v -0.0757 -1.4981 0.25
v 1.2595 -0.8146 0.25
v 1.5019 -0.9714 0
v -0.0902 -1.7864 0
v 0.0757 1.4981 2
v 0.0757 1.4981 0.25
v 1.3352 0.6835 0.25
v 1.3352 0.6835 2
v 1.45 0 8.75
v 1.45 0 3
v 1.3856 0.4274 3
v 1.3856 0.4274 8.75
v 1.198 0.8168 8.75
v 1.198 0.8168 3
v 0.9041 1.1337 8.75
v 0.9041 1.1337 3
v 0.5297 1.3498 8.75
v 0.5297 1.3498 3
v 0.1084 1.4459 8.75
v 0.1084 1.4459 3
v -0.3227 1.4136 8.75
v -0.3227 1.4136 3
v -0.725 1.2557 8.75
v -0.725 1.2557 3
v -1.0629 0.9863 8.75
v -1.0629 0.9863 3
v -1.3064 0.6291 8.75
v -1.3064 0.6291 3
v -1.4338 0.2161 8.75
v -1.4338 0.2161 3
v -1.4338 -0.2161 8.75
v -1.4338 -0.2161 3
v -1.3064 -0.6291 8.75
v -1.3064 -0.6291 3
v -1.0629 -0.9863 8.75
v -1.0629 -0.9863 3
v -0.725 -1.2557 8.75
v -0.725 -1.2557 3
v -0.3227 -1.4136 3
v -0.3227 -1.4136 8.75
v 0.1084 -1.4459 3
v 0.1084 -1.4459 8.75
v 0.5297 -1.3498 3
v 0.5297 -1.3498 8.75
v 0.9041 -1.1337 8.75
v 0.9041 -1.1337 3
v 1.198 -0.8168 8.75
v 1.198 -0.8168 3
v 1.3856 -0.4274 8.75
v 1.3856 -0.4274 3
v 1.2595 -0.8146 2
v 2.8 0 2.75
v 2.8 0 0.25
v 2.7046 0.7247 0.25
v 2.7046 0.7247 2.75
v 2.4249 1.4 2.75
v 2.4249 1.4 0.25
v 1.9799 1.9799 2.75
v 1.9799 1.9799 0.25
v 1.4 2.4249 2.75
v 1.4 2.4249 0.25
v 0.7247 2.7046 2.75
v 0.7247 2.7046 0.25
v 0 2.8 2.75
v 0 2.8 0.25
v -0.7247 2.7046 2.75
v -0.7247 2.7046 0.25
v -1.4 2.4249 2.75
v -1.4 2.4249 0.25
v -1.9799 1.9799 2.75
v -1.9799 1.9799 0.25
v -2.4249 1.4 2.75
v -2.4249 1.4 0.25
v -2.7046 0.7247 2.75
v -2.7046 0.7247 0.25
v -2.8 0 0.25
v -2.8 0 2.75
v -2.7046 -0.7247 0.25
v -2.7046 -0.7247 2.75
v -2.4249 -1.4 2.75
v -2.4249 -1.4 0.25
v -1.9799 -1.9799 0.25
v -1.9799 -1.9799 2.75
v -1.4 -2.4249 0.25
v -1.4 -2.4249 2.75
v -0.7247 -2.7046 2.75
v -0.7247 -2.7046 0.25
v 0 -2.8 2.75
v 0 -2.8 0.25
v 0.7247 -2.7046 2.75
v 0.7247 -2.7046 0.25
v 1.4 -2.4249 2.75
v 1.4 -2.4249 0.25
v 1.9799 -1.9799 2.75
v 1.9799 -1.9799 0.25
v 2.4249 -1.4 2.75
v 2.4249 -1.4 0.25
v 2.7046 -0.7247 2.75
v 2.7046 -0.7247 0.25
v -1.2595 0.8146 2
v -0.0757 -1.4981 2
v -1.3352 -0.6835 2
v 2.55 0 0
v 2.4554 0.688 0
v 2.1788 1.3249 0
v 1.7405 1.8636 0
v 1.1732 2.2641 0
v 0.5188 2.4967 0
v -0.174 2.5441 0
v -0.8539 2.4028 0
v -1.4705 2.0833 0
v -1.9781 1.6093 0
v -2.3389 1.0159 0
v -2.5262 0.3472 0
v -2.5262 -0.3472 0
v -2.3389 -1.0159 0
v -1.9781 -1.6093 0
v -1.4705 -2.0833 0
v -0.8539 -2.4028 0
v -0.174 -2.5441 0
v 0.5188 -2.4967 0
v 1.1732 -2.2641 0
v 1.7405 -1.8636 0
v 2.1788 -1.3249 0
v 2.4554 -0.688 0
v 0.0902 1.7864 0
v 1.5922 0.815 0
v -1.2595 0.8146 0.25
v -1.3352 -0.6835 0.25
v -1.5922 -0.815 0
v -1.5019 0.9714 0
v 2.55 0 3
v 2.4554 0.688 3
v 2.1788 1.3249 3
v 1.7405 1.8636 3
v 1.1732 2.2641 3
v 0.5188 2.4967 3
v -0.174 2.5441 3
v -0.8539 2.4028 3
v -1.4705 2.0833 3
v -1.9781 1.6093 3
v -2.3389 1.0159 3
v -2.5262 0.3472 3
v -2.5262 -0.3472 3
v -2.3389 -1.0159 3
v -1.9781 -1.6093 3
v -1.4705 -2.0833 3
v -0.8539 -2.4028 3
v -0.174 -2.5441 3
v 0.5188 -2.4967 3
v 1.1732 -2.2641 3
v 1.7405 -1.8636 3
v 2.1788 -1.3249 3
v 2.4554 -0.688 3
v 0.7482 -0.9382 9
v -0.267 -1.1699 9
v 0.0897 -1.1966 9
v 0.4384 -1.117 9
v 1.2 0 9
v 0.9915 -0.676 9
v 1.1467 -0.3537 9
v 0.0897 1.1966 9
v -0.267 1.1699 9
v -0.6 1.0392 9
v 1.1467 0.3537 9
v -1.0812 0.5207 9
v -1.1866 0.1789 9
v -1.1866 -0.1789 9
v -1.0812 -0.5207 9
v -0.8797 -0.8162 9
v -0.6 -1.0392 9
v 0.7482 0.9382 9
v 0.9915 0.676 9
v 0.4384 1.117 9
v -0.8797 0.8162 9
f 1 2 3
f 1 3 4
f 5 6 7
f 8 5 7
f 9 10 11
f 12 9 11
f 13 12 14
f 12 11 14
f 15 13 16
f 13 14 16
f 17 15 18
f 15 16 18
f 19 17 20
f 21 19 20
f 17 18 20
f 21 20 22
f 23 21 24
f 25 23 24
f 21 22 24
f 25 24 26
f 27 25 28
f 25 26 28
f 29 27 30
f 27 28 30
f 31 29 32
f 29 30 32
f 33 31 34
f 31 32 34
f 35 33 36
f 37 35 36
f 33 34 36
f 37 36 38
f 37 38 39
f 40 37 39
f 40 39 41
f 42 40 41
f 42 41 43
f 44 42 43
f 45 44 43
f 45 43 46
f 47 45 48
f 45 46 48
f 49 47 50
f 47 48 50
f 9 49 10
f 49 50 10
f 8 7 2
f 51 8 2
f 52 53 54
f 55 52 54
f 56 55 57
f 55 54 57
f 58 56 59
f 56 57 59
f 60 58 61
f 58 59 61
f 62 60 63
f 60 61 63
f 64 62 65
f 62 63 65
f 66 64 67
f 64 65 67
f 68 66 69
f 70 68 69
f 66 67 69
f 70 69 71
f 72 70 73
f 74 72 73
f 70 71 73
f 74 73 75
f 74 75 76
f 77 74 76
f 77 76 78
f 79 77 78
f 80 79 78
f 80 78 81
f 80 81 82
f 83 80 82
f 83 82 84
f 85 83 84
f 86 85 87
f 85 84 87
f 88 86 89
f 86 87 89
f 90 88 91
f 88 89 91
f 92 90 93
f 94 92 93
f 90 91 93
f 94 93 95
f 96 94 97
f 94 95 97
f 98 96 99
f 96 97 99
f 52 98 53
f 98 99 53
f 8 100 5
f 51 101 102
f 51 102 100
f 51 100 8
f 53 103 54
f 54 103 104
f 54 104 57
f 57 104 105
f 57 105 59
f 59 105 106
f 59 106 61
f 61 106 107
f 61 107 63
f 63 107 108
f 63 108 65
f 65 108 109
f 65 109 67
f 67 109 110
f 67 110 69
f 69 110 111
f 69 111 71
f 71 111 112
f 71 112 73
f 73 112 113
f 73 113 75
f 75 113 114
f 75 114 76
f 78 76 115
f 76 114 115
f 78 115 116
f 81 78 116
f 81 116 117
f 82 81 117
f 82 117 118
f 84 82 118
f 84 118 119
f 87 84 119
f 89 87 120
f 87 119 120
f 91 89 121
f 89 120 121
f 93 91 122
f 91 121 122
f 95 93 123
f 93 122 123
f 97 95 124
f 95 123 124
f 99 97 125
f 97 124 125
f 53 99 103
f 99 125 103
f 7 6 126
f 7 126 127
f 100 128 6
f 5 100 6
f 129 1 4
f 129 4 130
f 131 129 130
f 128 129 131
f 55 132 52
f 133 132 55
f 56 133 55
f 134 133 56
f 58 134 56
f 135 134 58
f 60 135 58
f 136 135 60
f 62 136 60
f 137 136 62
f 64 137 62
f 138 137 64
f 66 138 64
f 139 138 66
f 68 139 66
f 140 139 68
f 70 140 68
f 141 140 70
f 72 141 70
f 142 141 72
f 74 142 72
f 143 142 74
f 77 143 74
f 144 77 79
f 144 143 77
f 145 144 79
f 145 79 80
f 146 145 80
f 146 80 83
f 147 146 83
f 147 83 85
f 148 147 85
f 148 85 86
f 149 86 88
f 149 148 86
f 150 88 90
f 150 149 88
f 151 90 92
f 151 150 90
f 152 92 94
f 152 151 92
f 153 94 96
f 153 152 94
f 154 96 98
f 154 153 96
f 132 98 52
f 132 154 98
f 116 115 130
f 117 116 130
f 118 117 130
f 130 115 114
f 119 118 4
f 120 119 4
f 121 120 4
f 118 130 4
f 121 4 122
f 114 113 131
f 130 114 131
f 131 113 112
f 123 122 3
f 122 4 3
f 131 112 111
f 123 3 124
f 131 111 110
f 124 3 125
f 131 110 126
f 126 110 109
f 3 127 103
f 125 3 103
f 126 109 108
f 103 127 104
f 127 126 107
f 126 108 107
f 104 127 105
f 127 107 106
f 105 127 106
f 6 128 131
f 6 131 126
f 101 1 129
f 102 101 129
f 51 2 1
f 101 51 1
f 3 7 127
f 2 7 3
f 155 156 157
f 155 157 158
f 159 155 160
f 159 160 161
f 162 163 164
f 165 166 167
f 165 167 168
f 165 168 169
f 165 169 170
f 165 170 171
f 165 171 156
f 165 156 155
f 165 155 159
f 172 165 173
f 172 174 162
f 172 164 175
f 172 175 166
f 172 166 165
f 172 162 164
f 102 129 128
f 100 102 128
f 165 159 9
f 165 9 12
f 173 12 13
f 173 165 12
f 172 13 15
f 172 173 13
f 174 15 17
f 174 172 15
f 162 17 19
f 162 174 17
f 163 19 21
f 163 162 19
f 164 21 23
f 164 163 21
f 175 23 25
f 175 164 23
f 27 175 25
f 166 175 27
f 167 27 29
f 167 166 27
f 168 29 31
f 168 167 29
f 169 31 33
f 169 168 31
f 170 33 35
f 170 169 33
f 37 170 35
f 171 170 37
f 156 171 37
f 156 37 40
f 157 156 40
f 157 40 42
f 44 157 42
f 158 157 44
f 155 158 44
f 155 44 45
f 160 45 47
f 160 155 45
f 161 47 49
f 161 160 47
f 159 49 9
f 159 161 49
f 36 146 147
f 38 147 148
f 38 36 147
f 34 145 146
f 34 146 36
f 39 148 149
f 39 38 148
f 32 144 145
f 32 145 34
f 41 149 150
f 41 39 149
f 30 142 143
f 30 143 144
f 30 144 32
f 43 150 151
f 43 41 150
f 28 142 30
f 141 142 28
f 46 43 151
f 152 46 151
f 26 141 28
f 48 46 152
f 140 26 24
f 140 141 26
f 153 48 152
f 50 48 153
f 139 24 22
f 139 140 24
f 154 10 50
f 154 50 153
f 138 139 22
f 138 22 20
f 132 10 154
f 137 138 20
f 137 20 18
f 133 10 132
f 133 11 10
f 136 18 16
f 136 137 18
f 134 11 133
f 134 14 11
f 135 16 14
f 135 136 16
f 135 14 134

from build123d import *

# Parameters (mm, degrees)
SKETCH_R     = 2.8
PAD_DEPTH    = 3
SKETCH001_R  = 1.45
PAD001_DEPTH = 6
POCKET_DEPTH = 2
CHAMFER_SIZE = 0.25


with BuildPart() as part:
    # Sketch → Pad (new body)
    with BuildSketch(Plane.XY):
        Circle(SKETCH_R)
    extrude(amount=PAD_DEPTH)

    # Sketch001 (on Face3 of Pad) → Pad001 (join)
    with BuildSketch(Plane.XY.offset(3)):
        Circle(SKETCH001_R)
    extrude(amount=PAD001_DEPTH)

    # Sketch002 (on Face2 of Pad001) → Pocket (cut)
    with BuildSketch(Plane(origin=(0, 0, 0), x_dir=(1, 0, 0), z_dir=(0, 0, -1))):
        Polygon((1.259542, 0.814588), (-0.075682, 1.49809), (-1.335225, 0.683502), (-1.259542, -0.814588), (0.075682, -1.49809), (1.335225, -0.683502), align=None)
    extrude(amount=-POCKET_DEPTH, mode=Mode.SUBTRACT)

    # Chamfer
    chamfer_edges = [part.edges().sort_by_distance(p)[0] for p in [
        (-2.8, 0, 3),
        (-2.8, 0, 0),
        (1.297384, -0.065543, 0),
        (0.705454, 1.090796, 0),
        (-0.59193, 1.156339, 0),
        (-1.297384, 0.065543, 0),
        (-0.705454, -1.090796, 0),
        (0.59193, -1.156339, 0),
        (-1.45, 0, 9),
    ]]
    chamfer(chamfer_edges, length=CHAMFER_SIZE)


solid = part.part
